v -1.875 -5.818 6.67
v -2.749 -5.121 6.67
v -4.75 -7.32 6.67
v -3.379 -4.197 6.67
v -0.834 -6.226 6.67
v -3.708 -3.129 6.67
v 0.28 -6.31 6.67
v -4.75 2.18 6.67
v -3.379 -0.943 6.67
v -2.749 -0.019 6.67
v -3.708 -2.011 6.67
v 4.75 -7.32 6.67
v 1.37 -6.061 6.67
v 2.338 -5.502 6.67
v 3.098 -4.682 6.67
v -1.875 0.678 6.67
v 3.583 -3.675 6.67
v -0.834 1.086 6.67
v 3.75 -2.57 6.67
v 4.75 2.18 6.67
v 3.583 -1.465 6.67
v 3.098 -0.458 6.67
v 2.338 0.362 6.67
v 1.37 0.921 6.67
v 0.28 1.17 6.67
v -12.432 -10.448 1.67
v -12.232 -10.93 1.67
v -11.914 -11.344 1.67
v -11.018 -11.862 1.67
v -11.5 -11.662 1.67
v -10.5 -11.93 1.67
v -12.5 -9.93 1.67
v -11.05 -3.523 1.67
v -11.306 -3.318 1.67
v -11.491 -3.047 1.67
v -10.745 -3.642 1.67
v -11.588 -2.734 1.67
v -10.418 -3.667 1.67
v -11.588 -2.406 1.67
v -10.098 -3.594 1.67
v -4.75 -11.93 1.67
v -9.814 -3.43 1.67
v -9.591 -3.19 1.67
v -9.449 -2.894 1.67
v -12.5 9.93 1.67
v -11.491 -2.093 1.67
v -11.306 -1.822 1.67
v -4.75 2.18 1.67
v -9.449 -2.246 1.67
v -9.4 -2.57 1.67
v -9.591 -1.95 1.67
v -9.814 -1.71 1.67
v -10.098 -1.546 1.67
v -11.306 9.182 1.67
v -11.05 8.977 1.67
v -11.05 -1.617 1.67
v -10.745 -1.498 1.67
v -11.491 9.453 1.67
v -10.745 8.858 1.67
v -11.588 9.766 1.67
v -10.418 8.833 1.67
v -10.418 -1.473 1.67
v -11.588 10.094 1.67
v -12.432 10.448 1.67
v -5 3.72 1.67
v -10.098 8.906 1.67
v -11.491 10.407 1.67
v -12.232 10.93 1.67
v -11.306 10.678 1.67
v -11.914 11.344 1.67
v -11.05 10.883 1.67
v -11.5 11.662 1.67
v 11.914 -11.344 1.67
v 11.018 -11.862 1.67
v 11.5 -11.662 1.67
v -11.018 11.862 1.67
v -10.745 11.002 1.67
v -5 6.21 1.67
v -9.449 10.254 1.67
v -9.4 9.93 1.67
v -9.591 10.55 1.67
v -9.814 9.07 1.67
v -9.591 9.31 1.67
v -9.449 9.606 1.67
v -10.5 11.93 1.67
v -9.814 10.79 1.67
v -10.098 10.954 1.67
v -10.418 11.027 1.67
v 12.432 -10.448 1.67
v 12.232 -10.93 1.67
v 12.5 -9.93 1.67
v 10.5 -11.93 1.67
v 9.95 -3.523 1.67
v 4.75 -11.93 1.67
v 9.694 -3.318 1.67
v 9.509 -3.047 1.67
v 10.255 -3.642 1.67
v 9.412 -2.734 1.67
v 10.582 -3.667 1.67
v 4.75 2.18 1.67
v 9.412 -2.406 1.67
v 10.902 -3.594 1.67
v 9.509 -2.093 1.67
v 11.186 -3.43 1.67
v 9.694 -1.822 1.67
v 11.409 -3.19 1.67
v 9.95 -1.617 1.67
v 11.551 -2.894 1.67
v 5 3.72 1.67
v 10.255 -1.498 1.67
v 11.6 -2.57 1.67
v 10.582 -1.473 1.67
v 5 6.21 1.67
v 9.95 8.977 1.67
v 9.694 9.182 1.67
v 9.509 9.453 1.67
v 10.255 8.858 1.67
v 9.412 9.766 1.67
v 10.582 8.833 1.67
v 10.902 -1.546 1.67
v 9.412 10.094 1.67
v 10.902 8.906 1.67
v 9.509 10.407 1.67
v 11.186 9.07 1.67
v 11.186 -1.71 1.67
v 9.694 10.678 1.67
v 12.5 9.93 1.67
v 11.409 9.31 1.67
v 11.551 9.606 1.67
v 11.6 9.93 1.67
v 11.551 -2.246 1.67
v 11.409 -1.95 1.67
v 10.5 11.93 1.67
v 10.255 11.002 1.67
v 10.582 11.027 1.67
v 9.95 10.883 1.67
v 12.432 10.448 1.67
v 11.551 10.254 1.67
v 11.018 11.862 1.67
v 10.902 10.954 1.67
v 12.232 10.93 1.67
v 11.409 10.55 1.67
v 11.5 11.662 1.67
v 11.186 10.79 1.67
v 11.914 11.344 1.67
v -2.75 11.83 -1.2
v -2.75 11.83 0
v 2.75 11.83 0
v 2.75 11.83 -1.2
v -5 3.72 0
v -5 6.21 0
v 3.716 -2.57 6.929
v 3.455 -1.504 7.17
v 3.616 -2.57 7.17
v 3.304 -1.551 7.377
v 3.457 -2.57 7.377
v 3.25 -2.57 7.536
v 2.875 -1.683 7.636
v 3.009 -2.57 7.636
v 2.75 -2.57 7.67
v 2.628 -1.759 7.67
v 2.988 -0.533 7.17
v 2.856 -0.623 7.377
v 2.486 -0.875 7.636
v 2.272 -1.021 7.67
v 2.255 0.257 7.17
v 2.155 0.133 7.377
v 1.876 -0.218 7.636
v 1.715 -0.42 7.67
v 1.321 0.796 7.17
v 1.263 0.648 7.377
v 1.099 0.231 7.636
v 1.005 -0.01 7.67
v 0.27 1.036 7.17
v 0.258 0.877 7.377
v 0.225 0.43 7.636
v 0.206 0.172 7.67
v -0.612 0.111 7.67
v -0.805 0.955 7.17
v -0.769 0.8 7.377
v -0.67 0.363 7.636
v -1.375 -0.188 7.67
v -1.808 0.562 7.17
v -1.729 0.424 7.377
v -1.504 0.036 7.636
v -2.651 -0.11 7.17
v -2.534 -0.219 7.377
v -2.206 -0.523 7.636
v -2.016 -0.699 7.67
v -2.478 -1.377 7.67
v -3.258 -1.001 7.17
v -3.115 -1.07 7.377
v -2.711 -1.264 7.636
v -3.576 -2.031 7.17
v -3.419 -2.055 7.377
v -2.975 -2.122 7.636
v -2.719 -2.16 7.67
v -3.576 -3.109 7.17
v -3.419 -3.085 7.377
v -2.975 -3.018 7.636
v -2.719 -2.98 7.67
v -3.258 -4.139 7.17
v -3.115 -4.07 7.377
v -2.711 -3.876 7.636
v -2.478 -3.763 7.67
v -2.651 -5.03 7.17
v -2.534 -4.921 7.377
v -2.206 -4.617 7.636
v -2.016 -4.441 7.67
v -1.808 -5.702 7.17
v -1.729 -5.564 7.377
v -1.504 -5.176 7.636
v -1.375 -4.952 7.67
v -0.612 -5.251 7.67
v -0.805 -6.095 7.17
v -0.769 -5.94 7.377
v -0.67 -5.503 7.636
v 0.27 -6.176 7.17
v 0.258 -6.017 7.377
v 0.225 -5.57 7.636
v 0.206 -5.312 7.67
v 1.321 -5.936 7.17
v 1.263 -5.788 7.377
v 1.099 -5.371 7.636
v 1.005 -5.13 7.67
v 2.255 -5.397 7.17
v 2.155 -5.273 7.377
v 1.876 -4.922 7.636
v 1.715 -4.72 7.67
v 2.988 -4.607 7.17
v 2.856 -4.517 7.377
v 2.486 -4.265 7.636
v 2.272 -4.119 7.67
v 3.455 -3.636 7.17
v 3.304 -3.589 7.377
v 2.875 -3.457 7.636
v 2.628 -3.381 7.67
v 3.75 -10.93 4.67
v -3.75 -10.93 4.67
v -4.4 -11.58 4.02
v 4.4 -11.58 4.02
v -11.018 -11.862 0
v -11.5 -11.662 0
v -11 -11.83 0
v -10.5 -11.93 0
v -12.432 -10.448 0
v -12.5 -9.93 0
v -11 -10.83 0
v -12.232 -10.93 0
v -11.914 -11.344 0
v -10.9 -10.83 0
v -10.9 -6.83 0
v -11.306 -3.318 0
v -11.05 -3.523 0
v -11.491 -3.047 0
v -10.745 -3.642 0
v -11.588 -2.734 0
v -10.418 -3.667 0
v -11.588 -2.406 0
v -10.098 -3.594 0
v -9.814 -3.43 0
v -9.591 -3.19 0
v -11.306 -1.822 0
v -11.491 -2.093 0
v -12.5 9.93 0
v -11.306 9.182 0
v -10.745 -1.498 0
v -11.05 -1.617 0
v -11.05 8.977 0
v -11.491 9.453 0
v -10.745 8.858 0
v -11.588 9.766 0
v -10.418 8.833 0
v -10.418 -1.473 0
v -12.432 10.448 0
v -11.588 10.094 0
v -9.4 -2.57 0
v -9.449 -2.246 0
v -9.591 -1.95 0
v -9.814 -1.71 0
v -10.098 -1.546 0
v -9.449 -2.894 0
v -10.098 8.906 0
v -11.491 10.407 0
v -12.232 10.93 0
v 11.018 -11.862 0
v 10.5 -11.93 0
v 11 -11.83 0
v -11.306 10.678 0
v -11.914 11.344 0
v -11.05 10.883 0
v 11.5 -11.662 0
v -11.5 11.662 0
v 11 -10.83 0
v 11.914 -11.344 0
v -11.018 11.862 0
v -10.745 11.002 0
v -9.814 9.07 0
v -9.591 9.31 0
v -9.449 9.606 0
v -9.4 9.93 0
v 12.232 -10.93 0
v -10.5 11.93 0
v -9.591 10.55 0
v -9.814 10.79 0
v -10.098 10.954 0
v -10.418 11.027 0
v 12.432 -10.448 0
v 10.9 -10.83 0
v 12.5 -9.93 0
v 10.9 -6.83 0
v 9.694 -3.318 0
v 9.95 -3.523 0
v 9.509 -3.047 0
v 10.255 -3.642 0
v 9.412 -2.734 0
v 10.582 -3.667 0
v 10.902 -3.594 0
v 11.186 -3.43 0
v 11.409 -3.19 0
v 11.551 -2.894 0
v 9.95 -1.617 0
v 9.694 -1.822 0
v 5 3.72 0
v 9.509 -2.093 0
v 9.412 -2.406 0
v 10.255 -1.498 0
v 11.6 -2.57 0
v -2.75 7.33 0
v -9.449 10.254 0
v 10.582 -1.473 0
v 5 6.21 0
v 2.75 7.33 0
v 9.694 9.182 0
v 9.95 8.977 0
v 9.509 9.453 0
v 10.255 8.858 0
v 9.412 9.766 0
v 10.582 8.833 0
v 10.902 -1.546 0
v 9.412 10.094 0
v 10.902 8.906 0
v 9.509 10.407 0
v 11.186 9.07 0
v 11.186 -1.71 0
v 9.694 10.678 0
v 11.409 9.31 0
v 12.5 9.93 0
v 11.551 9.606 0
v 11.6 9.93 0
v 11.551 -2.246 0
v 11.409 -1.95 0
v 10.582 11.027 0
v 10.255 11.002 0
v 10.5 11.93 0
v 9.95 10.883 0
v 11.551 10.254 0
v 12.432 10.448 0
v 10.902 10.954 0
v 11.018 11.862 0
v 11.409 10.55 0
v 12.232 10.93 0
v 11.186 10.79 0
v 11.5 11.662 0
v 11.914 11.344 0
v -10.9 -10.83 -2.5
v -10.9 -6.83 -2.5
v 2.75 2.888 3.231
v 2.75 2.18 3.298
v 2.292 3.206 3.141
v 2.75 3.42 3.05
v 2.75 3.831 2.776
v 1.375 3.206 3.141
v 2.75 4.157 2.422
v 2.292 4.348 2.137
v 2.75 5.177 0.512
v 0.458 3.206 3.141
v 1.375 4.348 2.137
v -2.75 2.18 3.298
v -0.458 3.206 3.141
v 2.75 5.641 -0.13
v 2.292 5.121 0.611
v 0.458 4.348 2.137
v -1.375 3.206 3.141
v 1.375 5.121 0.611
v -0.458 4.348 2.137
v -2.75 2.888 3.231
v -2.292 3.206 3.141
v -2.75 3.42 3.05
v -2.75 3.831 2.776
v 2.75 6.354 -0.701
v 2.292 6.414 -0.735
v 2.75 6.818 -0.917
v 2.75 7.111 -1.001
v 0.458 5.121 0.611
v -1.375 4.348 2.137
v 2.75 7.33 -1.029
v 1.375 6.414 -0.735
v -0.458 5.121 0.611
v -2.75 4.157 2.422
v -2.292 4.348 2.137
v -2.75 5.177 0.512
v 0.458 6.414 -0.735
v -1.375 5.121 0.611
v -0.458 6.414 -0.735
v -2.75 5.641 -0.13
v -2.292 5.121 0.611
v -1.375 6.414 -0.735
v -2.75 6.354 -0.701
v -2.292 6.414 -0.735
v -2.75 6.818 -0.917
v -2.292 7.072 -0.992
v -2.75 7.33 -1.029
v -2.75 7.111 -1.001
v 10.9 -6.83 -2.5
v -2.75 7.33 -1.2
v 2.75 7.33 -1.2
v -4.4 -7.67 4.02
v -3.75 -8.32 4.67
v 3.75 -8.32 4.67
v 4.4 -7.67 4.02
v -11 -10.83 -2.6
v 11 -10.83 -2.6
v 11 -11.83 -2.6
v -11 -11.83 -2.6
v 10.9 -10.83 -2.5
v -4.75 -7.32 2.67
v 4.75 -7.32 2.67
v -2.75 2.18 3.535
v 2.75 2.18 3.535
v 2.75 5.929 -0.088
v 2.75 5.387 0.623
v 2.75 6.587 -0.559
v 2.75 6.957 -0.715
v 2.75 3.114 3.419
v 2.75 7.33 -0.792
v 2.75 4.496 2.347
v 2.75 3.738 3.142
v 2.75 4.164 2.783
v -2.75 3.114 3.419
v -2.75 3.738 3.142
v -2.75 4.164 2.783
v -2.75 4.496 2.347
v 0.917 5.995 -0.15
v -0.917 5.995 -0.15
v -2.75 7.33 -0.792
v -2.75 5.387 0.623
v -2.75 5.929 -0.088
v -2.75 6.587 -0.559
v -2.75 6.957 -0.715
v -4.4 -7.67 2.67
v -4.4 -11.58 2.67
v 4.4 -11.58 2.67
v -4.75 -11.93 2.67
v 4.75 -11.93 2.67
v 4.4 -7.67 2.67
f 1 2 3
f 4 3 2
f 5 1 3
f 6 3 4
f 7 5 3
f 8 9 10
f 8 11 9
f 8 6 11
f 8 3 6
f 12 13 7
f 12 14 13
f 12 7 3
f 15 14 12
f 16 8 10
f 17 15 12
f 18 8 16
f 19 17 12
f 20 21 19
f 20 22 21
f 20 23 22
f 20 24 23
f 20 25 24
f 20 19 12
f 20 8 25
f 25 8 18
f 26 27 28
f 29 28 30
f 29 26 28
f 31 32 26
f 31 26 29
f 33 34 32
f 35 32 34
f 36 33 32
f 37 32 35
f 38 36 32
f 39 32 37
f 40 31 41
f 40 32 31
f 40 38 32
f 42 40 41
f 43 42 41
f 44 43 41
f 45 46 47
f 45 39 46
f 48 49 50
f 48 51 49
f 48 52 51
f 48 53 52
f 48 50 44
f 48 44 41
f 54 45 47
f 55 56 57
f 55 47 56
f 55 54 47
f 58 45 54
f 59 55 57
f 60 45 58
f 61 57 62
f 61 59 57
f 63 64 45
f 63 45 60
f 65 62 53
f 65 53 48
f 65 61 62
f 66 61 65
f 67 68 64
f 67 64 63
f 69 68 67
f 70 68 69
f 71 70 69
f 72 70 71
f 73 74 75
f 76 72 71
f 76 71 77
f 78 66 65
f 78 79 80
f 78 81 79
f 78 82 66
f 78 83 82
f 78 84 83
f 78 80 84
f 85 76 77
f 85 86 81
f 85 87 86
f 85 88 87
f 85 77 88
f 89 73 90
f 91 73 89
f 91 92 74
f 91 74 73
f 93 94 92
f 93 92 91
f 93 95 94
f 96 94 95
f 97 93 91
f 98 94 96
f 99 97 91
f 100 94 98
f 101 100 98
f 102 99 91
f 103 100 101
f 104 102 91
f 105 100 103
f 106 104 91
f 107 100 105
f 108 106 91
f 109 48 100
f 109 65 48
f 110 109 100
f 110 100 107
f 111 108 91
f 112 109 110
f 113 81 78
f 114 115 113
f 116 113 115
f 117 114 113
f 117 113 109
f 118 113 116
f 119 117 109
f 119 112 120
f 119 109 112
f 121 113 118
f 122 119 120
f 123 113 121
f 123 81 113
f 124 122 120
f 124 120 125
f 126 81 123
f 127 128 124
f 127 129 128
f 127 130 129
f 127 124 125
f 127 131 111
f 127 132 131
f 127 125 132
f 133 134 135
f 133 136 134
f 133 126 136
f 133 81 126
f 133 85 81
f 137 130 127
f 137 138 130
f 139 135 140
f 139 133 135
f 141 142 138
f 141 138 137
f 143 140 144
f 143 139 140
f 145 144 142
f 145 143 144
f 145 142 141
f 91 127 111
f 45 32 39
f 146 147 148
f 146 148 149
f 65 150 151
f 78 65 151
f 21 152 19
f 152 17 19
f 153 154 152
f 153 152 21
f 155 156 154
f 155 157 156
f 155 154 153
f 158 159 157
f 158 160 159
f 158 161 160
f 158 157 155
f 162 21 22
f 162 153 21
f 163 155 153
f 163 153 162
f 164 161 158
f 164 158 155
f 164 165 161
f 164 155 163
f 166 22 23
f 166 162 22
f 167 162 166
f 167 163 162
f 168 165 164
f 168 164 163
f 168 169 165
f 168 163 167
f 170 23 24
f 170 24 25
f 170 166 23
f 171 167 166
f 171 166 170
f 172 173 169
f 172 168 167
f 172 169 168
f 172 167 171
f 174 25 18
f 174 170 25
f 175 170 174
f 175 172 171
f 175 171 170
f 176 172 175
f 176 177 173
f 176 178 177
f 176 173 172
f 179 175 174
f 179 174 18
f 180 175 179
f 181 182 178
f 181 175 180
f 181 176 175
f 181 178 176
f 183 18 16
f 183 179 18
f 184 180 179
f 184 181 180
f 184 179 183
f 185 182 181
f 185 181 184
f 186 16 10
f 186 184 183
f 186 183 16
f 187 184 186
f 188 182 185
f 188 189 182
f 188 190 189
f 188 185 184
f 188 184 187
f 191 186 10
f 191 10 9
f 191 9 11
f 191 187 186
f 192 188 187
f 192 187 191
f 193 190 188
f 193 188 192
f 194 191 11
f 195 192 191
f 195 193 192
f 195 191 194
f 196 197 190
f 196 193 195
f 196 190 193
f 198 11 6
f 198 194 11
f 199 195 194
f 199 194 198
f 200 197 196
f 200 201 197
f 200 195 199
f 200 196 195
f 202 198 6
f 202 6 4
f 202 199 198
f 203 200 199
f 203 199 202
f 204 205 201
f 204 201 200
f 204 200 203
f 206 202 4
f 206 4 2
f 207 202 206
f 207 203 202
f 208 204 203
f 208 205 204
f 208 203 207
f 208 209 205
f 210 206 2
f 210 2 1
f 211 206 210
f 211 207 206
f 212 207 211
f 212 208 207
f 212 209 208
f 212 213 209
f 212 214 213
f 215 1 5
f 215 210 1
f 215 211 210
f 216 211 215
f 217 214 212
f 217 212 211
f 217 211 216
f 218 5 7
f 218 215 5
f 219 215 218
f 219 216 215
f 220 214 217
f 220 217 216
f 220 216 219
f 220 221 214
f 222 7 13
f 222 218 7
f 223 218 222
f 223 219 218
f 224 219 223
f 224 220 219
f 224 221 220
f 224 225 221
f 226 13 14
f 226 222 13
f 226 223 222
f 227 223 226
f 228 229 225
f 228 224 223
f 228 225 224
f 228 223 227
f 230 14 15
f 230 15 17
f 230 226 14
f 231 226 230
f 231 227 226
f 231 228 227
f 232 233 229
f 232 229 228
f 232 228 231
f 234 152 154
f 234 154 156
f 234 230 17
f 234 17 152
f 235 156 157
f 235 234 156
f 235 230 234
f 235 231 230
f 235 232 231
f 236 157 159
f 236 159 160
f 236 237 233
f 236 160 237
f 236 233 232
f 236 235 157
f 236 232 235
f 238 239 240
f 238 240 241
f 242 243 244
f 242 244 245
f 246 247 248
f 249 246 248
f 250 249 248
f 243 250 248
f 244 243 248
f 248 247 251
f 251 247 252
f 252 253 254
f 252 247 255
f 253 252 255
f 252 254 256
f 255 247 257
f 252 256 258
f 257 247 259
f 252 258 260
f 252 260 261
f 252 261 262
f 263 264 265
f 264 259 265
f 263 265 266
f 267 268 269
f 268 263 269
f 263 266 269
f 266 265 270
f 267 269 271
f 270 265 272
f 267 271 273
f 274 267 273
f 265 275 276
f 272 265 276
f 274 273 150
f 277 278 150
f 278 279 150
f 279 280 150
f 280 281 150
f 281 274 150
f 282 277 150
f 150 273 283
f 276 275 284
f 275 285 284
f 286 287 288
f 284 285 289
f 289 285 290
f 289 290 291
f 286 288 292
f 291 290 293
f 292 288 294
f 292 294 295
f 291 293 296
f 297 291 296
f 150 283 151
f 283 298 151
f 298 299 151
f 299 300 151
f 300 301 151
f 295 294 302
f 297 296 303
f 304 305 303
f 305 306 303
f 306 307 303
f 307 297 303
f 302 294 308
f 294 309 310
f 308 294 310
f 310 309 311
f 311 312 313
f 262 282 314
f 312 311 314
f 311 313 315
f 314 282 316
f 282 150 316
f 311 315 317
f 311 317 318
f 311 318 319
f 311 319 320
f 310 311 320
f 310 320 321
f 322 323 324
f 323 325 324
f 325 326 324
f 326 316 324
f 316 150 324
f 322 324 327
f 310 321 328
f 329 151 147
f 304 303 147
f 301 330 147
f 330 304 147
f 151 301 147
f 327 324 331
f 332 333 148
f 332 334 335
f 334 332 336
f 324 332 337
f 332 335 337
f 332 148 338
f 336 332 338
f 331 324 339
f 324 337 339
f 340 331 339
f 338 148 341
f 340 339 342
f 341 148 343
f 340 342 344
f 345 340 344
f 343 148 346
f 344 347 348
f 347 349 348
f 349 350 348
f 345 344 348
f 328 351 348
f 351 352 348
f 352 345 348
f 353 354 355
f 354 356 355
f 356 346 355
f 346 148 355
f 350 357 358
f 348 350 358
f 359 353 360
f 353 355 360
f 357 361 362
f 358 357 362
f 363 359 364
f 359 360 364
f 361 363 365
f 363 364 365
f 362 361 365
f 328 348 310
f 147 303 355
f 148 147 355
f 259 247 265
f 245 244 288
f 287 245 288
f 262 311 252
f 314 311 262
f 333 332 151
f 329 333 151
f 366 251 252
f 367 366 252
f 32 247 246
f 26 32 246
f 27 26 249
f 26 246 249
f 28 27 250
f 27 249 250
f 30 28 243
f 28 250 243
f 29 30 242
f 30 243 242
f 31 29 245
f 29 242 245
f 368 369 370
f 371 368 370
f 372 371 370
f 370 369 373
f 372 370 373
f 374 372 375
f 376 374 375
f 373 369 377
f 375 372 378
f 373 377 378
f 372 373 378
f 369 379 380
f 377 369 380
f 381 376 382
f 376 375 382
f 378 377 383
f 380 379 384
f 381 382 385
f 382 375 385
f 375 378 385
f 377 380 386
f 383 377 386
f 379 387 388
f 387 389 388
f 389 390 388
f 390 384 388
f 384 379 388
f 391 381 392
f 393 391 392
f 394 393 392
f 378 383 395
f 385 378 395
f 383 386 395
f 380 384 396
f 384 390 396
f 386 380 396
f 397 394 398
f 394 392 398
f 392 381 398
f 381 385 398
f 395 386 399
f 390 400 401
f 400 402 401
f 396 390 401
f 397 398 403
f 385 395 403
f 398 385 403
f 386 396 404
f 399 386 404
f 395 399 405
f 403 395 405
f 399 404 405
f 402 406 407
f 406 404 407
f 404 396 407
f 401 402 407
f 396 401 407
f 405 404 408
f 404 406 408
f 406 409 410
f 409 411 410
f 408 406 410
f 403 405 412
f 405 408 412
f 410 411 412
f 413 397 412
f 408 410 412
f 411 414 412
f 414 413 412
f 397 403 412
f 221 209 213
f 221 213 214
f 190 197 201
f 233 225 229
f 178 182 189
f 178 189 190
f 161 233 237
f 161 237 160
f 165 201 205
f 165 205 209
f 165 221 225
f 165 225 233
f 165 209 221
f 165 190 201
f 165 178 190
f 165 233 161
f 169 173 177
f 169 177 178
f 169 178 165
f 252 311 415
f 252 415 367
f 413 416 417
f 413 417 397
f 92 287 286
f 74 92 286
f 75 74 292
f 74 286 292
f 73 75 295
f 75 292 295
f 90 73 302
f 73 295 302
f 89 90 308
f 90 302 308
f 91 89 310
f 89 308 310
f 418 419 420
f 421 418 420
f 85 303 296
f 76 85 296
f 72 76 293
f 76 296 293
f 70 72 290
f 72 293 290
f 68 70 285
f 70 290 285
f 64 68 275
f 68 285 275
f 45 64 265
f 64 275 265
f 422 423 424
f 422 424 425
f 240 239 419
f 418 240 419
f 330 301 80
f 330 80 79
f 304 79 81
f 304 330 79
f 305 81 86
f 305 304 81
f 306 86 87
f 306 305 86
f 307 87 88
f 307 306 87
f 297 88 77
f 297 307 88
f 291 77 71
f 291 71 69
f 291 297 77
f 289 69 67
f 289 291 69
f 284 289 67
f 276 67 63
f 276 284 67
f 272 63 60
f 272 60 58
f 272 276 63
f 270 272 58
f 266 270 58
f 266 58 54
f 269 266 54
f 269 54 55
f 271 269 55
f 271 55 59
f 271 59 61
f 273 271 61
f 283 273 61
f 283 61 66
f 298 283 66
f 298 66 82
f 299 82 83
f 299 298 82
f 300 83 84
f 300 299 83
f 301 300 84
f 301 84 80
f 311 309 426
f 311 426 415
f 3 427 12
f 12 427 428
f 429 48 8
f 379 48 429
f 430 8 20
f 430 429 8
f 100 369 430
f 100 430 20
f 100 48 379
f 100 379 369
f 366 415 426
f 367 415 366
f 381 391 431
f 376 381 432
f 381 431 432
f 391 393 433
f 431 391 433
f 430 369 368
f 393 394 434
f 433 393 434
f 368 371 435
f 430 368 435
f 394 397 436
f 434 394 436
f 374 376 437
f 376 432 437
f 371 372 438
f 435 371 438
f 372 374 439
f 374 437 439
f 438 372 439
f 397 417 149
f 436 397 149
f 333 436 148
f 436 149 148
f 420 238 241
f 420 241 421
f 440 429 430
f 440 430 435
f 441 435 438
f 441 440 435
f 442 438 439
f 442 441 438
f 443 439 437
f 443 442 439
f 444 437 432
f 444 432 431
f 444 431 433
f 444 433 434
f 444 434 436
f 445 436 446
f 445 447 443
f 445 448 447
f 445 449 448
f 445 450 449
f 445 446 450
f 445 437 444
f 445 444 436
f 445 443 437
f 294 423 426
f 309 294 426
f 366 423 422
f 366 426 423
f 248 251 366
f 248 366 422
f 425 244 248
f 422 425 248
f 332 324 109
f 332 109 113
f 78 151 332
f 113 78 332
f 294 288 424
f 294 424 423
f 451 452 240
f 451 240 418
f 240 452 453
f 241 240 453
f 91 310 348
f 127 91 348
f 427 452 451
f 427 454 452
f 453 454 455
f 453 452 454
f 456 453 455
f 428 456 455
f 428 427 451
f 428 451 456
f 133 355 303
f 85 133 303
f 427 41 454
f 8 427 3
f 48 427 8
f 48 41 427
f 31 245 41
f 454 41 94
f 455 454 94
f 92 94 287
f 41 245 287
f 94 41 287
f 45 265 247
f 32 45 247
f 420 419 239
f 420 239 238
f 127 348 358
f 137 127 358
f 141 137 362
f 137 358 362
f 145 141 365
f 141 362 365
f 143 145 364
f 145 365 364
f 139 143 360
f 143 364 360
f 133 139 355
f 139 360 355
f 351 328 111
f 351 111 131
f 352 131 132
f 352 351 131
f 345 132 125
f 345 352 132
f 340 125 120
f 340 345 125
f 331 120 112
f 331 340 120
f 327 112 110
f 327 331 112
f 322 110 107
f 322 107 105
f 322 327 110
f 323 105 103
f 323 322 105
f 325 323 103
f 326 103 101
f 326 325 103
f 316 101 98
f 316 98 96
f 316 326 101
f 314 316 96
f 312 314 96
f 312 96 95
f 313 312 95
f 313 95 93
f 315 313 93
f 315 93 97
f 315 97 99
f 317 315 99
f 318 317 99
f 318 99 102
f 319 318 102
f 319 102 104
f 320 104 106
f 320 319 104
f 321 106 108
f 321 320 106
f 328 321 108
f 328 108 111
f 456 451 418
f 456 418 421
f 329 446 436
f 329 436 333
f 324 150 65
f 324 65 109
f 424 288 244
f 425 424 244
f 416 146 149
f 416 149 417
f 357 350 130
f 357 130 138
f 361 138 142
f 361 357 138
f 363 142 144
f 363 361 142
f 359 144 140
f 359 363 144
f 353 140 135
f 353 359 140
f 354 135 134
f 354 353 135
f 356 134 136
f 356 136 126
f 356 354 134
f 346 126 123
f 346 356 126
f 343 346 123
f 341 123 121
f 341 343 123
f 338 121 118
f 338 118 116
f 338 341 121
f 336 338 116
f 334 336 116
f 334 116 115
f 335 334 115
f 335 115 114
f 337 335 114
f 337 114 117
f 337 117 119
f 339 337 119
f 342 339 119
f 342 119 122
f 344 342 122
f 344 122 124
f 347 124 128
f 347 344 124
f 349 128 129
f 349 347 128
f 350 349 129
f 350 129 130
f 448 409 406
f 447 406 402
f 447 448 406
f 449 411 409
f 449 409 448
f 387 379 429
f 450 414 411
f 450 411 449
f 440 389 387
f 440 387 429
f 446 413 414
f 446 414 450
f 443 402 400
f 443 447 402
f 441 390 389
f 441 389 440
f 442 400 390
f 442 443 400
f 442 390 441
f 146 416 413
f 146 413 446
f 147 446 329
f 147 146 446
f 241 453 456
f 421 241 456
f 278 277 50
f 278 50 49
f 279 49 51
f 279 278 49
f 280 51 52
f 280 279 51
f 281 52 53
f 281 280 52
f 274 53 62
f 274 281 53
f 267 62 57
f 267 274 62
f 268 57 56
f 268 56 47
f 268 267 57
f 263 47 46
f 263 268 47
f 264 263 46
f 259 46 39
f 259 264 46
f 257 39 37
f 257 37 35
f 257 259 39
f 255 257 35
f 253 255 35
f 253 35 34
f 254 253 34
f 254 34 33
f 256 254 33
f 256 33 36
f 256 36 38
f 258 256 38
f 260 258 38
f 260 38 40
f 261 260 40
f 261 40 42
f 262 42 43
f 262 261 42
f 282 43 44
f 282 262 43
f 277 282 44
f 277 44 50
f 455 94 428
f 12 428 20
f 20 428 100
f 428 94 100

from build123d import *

# Parameters (mm, degrees)
SKETCH1_R                = 1.1
SKETCH1_W                = 10
SKETCH1_H                = 2.49
BOSS_EXTRUDE1_DEPTH      = 1.67
SKETCH2_W                = 9.5
SKETCH2_H                = 9.5
BOSS_EXTRUDE2_DEPTH      = 5
SKETCH3_R                = 3.75
BOSS_EXTRUDE3_DEPTH      = 1
FILLET1_R                = 1
SKETCH4_W                = 9.5
SKETCH4_H                = 4.61
BOSS_EXTRUDE4_DEPTH      = 1
SKETCH5_W                = 8.8
SKETCH5_H                = 3.91
BOSS_EXTRUDE5_DEPTH      = 2
CHAMFER1_SIZE            = 0.65
BOSS_EXTRUDE6_DEPTH      = 2.75
BOSS_EXTRUDE6_DEPTH_BACK = 2.75
SKETCH7_W                = 22
SKETCH7_H                = 1
BOSS_EXTRUDE7_DEPTH      = 2.6
SKETCH9_W                = 21.8
SKETCH9_H                = 4
BOSS_EXTRUDE8_DEPTH      = 2.5


with BuildPart() as part:
    # Sketch1 → Boss-Extrude1 (new body)
    with BuildSketch(Plane.XY):
        with BuildLine():
            Line((-10.5, -11.93), (10.5, -11.93))
            ThreePointArc((10.5, -11.93), (11.914213562, -11.344213562), (12.5, -9.93))
            Line((12.5, -9.93), (12.5, 9.93))
            ThreePointArc((12.5, 9.93), (11.914213562, 11.344213562), (10.5, 11.93))
            Line((10.5, 11.93), (-10.5, 11.93))
            ThreePointArc((-10.5, 11.93), (-11.914213562, 11.344213562), (-12.5, 9.93))
            Line((-12.5, 9.93), (-12.5, -9.93))
            ThreePointArc((-12.5, -9.93), (-11.914213562, -11.344213562), (-10.5, -11.93))
        make_face()
        with Locations((-10.5, 9.93)):
            Circle(SKETCH1_R, mode=Mode.SUBTRACT)
        with Locations((10.5, 9.93)):
            Circle(SKETCH1_R, mode=Mode.SUBTRACT)
        with Locations((-10.5, -2.57)):
            Circle(SKETCH1_R, mode=Mode.SUBTRACT)
        with Locations((10.5, -2.57)):
            Circle(SKETCH1_R, mode=Mode.SUBTRACT)
        with Locations((0, 4.965)):
            Rectangle(SKETCH1_W, SKETCH1_H, mode=Mode.SUBTRACT)
    extrude(amount=BOSS_EXTRUDE1_DEPTH)

    # Sketch2 → Boss-Extrude2 (add)
    with BuildSketch(Plane.XY.offset(1.67)):
        with Locations((0, -2.57)):
            Rectangle(SKETCH2_W, SKETCH2_H)
    extrude(amount=BOSS_EXTRUDE2_DEPTH)

    # Sketch3 → Boss-Extrude3 (add)
    with BuildSketch(Plane.XY.offset(6.67)):
        with Locations((0, -2.57)):
            Circle(SKETCH3_R)
    extrude(amount=BOSS_EXTRUDE3_DEPTH)

    # Fillet1
    fillet1_edges = [part.edges().sort_by_distance(p)[0] for p in [
        (-3.75, -2.57, 7.67),
    ]]
    fillet(fillet1_edges, radius=FILLET1_R - 0.0001)  # a hair under: the kernel refuses the full size

    # Sketch4 → Boss-Extrude4 (add)
    with BuildSketch(Plane.XY.offset(1.67)):
        with Locations((0, -9.625)):
            Rectangle(SKETCH4_W, SKETCH4_H)
    extrude(amount=BOSS_EXTRUDE4_DEPTH)

    # Sketch5 → Boss-Extrude5 (add)
    with BuildSketch(Plane.XY.offset(2.67)):
        with Locations((0, -9.625)):
            Rectangle(SKETCH5_W, SKETCH5_H)
    extrude(amount=BOSS_EXTRUDE5_DEPTH)

    # Chamfer1
    chamfer1_edges = [part.edges().sort_by_distance(p)[0] for p in [
        (4.4, -9.625, 4.67),
        (0, -7.67, 4.67),
        (-4.4, -9.625, 4.67),
        (0, -11.58, 4.67),
    ]]
    chamfer(chamfer1_edges, length=CHAMFER1_SIZE)

    # Sketch6 → Boss-Extrude6 (add, two sides: drawn at the far end of the back side and taken through both)
    with BuildSketch(Plane(origin=(0, 0, 0), x_dir=(0, 0, -1), z_dir=(1, 0, 0)).offset(-BOSS_EXTRUDE6_DEPTH_BACK)):
        with BuildLine():
            Line((-3.298312235, 2.18), (-3.534834551, 2.18))
            add(Edge.make_bspline(
                [(-3.534834551, 2.18), (-3.534834551, 4.944931667), (-0.47055609, 4.534187875), (0.730328755, 6.849182289), (0.79246314, 7.291776262), (0.79246314, 7.33)],
                knots=[0, 0, 0, 0, 0.784106591, 0.986086671, 1, 1, 1, 1], degree=3))
            Line((0.79246314, 7.33), (0, 7.33))
            Line((0, 7.33), (0, 11.83))
            Line((0, 11.83), (1.2, 11.83))
            Line((1.2, 11.83), (1.2, 7.33))
            Line((1.2, 7.33), (1.028985456, 7.33))
            add(Edge.make_bspline(
                [(-3.298312235, 2.18), (-3.298312235, 2.369708531), (-3.268931161, 2.774833109), (-3.111748266, 3.367193807), (-2.767956088, 3.909628415), (-2.161529025, 4.362480865), (-1.410396471, 4.725696596), (-0.605704822, 5.099255509), (0.165819225, 5.601384629), (0.682287807, 6.265090703), (0.910091228, 6.771630764), (0.98633259, 7.041505733), (1.014862156, 7.172550739), (1.028985456, 7.28085491), (1.028985456, 7.33)],
                knots=[0, 0, 0, 0, 0.0625, 0.125, 0.25, 0.375, 0.5, 0.625, 0.75, 0.875, 0.9375, 0.96875, 0.984375, 1, 1, 1, 1], degree=3))
        make_face()
    extrude(amount=BOSS_EXTRUDE6_DEPTH + BOSS_EXTRUDE6_DEPTH_BACK)

    # Sketch7 → Boss-Extrude7 (add)
    with BuildSketch(Plane(origin=(0, 0, 0), x_dir=(-1, 0, 0), z_dir=(0, 0, -1))):
        with Locations((0, -11.33)):
            Rectangle(SKETCH7_W, SKETCH7_H)
    extrude(amount=BOSS_EXTRUDE7_DEPTH)

    # Sketch9 → Boss-Extrude8 (add)
    with BuildSketch(Plane(origin=(0, 0, 0), x_dir=(-1, 0, 0), z_dir=(0, 0, -1))):
        with Locations((0, -8.83)):
            Rectangle(SKETCH9_W, SKETCH9_H)
    extrude(amount=BOSS_EXTRUDE8_DEPTH)


solid = part.part
